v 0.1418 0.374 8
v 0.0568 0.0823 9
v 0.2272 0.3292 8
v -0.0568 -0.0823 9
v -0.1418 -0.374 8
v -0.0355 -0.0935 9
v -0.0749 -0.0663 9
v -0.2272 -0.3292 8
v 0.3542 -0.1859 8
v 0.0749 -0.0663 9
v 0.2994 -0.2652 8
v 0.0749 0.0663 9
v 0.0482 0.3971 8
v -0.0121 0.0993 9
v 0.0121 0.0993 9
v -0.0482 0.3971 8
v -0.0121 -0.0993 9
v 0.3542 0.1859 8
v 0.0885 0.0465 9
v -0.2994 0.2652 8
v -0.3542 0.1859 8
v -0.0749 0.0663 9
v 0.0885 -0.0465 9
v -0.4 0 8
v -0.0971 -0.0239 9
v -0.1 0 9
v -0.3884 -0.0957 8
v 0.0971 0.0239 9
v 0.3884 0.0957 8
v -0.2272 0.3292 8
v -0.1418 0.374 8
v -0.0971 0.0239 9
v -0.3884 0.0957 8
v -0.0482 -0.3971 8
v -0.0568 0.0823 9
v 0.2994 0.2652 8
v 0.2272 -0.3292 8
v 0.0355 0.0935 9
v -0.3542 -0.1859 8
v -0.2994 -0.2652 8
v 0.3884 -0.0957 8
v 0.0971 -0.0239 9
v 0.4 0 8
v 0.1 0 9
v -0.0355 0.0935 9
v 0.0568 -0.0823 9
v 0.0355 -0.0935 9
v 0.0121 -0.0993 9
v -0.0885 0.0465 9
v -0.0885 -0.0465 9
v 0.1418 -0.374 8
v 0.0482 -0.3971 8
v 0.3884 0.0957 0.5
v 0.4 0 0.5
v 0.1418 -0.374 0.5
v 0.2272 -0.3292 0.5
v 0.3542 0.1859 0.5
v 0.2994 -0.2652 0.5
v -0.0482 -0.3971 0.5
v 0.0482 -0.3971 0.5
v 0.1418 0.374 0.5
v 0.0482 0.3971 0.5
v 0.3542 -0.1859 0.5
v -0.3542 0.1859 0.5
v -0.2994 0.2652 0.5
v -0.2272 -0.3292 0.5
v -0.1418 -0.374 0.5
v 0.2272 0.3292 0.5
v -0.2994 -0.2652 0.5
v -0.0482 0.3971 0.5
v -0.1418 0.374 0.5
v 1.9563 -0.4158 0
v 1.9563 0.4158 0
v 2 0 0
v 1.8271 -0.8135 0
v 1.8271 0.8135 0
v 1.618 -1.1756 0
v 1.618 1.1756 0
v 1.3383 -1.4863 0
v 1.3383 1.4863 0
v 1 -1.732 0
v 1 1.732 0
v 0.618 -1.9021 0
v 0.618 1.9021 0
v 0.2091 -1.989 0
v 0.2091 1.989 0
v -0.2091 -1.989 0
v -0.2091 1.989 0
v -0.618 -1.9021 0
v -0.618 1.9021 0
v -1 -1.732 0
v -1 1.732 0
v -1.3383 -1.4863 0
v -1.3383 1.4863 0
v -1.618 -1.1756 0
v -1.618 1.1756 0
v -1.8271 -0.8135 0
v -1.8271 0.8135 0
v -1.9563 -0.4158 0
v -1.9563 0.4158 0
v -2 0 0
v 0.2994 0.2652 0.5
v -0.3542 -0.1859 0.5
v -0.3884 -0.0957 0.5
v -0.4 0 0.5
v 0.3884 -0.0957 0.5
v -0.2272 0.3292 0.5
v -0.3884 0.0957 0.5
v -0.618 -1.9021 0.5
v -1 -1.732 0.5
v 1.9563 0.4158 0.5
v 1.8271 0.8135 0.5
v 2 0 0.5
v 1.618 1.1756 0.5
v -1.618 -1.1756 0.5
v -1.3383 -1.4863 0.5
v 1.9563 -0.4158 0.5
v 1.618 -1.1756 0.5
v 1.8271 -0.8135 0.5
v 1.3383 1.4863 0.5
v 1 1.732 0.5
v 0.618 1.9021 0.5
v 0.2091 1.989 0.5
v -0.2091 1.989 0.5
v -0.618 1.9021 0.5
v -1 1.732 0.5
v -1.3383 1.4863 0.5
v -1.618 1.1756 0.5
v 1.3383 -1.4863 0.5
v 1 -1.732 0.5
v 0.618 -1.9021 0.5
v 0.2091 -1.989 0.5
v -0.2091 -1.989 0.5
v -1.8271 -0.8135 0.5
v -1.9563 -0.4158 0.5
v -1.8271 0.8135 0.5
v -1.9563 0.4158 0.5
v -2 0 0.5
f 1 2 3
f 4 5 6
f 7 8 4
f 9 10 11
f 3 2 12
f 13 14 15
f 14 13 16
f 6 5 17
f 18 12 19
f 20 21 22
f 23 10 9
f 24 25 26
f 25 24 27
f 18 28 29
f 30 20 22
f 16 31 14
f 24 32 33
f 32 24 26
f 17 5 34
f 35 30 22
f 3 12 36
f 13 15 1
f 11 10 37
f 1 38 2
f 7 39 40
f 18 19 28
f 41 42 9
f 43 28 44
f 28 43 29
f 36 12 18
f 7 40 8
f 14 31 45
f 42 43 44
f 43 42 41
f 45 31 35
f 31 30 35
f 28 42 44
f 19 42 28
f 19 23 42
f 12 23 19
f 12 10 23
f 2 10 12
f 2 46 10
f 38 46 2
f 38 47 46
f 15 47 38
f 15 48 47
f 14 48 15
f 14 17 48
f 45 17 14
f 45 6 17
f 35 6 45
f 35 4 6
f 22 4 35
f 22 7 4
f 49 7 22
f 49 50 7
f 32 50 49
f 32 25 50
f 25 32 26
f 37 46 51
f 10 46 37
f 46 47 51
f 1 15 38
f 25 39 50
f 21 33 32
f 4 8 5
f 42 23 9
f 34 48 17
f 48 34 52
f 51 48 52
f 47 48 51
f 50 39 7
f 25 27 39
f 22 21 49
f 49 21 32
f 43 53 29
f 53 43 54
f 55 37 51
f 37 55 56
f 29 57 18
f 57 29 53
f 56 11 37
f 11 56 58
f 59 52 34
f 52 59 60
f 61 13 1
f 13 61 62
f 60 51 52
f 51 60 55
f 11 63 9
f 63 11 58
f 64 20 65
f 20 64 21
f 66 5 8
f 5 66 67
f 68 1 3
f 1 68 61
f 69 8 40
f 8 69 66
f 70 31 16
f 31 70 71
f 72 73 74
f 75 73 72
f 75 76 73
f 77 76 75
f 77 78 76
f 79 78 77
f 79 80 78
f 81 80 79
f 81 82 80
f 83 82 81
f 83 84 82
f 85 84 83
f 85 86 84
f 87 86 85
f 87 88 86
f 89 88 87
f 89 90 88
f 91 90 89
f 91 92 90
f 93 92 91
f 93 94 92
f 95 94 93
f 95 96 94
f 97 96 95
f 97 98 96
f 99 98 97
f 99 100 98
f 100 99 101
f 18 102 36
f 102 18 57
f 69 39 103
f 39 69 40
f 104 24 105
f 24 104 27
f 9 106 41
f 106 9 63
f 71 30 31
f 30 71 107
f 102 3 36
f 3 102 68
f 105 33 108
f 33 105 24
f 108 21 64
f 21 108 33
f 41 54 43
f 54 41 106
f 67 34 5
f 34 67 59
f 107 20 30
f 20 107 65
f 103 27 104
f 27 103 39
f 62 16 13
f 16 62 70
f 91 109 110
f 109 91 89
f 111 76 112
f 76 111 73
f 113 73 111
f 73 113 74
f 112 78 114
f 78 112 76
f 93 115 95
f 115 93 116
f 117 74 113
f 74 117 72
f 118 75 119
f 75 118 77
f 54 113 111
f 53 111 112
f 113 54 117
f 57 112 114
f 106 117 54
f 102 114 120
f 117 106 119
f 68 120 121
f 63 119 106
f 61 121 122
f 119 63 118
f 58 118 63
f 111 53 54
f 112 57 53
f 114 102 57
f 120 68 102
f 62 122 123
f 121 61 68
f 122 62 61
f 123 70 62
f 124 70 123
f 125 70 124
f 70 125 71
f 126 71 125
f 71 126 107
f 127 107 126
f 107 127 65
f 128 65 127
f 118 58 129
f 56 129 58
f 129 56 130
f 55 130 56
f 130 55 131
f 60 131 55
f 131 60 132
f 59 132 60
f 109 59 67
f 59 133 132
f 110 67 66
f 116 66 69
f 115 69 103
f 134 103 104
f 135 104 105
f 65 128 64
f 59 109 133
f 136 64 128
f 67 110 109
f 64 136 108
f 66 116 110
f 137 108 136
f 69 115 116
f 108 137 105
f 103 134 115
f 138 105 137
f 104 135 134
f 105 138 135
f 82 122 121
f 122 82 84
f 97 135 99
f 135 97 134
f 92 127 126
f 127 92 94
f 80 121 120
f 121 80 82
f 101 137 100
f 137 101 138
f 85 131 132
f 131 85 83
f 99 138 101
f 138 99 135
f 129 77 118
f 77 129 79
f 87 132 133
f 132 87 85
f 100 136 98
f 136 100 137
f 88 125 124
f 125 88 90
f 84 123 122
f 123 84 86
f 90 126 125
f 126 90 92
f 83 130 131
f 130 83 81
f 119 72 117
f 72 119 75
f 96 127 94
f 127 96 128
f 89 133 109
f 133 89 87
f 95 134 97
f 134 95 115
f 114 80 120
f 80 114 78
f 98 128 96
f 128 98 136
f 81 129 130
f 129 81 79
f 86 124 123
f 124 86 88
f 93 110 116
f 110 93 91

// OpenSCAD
translate([0,0,8])
cylinder(1,0.4,0.1,$fs=0.1);
cylinder(8,0.4,0.4,$fs=0.1);
cylinder(0.5,2,2,$fs=0.1);
